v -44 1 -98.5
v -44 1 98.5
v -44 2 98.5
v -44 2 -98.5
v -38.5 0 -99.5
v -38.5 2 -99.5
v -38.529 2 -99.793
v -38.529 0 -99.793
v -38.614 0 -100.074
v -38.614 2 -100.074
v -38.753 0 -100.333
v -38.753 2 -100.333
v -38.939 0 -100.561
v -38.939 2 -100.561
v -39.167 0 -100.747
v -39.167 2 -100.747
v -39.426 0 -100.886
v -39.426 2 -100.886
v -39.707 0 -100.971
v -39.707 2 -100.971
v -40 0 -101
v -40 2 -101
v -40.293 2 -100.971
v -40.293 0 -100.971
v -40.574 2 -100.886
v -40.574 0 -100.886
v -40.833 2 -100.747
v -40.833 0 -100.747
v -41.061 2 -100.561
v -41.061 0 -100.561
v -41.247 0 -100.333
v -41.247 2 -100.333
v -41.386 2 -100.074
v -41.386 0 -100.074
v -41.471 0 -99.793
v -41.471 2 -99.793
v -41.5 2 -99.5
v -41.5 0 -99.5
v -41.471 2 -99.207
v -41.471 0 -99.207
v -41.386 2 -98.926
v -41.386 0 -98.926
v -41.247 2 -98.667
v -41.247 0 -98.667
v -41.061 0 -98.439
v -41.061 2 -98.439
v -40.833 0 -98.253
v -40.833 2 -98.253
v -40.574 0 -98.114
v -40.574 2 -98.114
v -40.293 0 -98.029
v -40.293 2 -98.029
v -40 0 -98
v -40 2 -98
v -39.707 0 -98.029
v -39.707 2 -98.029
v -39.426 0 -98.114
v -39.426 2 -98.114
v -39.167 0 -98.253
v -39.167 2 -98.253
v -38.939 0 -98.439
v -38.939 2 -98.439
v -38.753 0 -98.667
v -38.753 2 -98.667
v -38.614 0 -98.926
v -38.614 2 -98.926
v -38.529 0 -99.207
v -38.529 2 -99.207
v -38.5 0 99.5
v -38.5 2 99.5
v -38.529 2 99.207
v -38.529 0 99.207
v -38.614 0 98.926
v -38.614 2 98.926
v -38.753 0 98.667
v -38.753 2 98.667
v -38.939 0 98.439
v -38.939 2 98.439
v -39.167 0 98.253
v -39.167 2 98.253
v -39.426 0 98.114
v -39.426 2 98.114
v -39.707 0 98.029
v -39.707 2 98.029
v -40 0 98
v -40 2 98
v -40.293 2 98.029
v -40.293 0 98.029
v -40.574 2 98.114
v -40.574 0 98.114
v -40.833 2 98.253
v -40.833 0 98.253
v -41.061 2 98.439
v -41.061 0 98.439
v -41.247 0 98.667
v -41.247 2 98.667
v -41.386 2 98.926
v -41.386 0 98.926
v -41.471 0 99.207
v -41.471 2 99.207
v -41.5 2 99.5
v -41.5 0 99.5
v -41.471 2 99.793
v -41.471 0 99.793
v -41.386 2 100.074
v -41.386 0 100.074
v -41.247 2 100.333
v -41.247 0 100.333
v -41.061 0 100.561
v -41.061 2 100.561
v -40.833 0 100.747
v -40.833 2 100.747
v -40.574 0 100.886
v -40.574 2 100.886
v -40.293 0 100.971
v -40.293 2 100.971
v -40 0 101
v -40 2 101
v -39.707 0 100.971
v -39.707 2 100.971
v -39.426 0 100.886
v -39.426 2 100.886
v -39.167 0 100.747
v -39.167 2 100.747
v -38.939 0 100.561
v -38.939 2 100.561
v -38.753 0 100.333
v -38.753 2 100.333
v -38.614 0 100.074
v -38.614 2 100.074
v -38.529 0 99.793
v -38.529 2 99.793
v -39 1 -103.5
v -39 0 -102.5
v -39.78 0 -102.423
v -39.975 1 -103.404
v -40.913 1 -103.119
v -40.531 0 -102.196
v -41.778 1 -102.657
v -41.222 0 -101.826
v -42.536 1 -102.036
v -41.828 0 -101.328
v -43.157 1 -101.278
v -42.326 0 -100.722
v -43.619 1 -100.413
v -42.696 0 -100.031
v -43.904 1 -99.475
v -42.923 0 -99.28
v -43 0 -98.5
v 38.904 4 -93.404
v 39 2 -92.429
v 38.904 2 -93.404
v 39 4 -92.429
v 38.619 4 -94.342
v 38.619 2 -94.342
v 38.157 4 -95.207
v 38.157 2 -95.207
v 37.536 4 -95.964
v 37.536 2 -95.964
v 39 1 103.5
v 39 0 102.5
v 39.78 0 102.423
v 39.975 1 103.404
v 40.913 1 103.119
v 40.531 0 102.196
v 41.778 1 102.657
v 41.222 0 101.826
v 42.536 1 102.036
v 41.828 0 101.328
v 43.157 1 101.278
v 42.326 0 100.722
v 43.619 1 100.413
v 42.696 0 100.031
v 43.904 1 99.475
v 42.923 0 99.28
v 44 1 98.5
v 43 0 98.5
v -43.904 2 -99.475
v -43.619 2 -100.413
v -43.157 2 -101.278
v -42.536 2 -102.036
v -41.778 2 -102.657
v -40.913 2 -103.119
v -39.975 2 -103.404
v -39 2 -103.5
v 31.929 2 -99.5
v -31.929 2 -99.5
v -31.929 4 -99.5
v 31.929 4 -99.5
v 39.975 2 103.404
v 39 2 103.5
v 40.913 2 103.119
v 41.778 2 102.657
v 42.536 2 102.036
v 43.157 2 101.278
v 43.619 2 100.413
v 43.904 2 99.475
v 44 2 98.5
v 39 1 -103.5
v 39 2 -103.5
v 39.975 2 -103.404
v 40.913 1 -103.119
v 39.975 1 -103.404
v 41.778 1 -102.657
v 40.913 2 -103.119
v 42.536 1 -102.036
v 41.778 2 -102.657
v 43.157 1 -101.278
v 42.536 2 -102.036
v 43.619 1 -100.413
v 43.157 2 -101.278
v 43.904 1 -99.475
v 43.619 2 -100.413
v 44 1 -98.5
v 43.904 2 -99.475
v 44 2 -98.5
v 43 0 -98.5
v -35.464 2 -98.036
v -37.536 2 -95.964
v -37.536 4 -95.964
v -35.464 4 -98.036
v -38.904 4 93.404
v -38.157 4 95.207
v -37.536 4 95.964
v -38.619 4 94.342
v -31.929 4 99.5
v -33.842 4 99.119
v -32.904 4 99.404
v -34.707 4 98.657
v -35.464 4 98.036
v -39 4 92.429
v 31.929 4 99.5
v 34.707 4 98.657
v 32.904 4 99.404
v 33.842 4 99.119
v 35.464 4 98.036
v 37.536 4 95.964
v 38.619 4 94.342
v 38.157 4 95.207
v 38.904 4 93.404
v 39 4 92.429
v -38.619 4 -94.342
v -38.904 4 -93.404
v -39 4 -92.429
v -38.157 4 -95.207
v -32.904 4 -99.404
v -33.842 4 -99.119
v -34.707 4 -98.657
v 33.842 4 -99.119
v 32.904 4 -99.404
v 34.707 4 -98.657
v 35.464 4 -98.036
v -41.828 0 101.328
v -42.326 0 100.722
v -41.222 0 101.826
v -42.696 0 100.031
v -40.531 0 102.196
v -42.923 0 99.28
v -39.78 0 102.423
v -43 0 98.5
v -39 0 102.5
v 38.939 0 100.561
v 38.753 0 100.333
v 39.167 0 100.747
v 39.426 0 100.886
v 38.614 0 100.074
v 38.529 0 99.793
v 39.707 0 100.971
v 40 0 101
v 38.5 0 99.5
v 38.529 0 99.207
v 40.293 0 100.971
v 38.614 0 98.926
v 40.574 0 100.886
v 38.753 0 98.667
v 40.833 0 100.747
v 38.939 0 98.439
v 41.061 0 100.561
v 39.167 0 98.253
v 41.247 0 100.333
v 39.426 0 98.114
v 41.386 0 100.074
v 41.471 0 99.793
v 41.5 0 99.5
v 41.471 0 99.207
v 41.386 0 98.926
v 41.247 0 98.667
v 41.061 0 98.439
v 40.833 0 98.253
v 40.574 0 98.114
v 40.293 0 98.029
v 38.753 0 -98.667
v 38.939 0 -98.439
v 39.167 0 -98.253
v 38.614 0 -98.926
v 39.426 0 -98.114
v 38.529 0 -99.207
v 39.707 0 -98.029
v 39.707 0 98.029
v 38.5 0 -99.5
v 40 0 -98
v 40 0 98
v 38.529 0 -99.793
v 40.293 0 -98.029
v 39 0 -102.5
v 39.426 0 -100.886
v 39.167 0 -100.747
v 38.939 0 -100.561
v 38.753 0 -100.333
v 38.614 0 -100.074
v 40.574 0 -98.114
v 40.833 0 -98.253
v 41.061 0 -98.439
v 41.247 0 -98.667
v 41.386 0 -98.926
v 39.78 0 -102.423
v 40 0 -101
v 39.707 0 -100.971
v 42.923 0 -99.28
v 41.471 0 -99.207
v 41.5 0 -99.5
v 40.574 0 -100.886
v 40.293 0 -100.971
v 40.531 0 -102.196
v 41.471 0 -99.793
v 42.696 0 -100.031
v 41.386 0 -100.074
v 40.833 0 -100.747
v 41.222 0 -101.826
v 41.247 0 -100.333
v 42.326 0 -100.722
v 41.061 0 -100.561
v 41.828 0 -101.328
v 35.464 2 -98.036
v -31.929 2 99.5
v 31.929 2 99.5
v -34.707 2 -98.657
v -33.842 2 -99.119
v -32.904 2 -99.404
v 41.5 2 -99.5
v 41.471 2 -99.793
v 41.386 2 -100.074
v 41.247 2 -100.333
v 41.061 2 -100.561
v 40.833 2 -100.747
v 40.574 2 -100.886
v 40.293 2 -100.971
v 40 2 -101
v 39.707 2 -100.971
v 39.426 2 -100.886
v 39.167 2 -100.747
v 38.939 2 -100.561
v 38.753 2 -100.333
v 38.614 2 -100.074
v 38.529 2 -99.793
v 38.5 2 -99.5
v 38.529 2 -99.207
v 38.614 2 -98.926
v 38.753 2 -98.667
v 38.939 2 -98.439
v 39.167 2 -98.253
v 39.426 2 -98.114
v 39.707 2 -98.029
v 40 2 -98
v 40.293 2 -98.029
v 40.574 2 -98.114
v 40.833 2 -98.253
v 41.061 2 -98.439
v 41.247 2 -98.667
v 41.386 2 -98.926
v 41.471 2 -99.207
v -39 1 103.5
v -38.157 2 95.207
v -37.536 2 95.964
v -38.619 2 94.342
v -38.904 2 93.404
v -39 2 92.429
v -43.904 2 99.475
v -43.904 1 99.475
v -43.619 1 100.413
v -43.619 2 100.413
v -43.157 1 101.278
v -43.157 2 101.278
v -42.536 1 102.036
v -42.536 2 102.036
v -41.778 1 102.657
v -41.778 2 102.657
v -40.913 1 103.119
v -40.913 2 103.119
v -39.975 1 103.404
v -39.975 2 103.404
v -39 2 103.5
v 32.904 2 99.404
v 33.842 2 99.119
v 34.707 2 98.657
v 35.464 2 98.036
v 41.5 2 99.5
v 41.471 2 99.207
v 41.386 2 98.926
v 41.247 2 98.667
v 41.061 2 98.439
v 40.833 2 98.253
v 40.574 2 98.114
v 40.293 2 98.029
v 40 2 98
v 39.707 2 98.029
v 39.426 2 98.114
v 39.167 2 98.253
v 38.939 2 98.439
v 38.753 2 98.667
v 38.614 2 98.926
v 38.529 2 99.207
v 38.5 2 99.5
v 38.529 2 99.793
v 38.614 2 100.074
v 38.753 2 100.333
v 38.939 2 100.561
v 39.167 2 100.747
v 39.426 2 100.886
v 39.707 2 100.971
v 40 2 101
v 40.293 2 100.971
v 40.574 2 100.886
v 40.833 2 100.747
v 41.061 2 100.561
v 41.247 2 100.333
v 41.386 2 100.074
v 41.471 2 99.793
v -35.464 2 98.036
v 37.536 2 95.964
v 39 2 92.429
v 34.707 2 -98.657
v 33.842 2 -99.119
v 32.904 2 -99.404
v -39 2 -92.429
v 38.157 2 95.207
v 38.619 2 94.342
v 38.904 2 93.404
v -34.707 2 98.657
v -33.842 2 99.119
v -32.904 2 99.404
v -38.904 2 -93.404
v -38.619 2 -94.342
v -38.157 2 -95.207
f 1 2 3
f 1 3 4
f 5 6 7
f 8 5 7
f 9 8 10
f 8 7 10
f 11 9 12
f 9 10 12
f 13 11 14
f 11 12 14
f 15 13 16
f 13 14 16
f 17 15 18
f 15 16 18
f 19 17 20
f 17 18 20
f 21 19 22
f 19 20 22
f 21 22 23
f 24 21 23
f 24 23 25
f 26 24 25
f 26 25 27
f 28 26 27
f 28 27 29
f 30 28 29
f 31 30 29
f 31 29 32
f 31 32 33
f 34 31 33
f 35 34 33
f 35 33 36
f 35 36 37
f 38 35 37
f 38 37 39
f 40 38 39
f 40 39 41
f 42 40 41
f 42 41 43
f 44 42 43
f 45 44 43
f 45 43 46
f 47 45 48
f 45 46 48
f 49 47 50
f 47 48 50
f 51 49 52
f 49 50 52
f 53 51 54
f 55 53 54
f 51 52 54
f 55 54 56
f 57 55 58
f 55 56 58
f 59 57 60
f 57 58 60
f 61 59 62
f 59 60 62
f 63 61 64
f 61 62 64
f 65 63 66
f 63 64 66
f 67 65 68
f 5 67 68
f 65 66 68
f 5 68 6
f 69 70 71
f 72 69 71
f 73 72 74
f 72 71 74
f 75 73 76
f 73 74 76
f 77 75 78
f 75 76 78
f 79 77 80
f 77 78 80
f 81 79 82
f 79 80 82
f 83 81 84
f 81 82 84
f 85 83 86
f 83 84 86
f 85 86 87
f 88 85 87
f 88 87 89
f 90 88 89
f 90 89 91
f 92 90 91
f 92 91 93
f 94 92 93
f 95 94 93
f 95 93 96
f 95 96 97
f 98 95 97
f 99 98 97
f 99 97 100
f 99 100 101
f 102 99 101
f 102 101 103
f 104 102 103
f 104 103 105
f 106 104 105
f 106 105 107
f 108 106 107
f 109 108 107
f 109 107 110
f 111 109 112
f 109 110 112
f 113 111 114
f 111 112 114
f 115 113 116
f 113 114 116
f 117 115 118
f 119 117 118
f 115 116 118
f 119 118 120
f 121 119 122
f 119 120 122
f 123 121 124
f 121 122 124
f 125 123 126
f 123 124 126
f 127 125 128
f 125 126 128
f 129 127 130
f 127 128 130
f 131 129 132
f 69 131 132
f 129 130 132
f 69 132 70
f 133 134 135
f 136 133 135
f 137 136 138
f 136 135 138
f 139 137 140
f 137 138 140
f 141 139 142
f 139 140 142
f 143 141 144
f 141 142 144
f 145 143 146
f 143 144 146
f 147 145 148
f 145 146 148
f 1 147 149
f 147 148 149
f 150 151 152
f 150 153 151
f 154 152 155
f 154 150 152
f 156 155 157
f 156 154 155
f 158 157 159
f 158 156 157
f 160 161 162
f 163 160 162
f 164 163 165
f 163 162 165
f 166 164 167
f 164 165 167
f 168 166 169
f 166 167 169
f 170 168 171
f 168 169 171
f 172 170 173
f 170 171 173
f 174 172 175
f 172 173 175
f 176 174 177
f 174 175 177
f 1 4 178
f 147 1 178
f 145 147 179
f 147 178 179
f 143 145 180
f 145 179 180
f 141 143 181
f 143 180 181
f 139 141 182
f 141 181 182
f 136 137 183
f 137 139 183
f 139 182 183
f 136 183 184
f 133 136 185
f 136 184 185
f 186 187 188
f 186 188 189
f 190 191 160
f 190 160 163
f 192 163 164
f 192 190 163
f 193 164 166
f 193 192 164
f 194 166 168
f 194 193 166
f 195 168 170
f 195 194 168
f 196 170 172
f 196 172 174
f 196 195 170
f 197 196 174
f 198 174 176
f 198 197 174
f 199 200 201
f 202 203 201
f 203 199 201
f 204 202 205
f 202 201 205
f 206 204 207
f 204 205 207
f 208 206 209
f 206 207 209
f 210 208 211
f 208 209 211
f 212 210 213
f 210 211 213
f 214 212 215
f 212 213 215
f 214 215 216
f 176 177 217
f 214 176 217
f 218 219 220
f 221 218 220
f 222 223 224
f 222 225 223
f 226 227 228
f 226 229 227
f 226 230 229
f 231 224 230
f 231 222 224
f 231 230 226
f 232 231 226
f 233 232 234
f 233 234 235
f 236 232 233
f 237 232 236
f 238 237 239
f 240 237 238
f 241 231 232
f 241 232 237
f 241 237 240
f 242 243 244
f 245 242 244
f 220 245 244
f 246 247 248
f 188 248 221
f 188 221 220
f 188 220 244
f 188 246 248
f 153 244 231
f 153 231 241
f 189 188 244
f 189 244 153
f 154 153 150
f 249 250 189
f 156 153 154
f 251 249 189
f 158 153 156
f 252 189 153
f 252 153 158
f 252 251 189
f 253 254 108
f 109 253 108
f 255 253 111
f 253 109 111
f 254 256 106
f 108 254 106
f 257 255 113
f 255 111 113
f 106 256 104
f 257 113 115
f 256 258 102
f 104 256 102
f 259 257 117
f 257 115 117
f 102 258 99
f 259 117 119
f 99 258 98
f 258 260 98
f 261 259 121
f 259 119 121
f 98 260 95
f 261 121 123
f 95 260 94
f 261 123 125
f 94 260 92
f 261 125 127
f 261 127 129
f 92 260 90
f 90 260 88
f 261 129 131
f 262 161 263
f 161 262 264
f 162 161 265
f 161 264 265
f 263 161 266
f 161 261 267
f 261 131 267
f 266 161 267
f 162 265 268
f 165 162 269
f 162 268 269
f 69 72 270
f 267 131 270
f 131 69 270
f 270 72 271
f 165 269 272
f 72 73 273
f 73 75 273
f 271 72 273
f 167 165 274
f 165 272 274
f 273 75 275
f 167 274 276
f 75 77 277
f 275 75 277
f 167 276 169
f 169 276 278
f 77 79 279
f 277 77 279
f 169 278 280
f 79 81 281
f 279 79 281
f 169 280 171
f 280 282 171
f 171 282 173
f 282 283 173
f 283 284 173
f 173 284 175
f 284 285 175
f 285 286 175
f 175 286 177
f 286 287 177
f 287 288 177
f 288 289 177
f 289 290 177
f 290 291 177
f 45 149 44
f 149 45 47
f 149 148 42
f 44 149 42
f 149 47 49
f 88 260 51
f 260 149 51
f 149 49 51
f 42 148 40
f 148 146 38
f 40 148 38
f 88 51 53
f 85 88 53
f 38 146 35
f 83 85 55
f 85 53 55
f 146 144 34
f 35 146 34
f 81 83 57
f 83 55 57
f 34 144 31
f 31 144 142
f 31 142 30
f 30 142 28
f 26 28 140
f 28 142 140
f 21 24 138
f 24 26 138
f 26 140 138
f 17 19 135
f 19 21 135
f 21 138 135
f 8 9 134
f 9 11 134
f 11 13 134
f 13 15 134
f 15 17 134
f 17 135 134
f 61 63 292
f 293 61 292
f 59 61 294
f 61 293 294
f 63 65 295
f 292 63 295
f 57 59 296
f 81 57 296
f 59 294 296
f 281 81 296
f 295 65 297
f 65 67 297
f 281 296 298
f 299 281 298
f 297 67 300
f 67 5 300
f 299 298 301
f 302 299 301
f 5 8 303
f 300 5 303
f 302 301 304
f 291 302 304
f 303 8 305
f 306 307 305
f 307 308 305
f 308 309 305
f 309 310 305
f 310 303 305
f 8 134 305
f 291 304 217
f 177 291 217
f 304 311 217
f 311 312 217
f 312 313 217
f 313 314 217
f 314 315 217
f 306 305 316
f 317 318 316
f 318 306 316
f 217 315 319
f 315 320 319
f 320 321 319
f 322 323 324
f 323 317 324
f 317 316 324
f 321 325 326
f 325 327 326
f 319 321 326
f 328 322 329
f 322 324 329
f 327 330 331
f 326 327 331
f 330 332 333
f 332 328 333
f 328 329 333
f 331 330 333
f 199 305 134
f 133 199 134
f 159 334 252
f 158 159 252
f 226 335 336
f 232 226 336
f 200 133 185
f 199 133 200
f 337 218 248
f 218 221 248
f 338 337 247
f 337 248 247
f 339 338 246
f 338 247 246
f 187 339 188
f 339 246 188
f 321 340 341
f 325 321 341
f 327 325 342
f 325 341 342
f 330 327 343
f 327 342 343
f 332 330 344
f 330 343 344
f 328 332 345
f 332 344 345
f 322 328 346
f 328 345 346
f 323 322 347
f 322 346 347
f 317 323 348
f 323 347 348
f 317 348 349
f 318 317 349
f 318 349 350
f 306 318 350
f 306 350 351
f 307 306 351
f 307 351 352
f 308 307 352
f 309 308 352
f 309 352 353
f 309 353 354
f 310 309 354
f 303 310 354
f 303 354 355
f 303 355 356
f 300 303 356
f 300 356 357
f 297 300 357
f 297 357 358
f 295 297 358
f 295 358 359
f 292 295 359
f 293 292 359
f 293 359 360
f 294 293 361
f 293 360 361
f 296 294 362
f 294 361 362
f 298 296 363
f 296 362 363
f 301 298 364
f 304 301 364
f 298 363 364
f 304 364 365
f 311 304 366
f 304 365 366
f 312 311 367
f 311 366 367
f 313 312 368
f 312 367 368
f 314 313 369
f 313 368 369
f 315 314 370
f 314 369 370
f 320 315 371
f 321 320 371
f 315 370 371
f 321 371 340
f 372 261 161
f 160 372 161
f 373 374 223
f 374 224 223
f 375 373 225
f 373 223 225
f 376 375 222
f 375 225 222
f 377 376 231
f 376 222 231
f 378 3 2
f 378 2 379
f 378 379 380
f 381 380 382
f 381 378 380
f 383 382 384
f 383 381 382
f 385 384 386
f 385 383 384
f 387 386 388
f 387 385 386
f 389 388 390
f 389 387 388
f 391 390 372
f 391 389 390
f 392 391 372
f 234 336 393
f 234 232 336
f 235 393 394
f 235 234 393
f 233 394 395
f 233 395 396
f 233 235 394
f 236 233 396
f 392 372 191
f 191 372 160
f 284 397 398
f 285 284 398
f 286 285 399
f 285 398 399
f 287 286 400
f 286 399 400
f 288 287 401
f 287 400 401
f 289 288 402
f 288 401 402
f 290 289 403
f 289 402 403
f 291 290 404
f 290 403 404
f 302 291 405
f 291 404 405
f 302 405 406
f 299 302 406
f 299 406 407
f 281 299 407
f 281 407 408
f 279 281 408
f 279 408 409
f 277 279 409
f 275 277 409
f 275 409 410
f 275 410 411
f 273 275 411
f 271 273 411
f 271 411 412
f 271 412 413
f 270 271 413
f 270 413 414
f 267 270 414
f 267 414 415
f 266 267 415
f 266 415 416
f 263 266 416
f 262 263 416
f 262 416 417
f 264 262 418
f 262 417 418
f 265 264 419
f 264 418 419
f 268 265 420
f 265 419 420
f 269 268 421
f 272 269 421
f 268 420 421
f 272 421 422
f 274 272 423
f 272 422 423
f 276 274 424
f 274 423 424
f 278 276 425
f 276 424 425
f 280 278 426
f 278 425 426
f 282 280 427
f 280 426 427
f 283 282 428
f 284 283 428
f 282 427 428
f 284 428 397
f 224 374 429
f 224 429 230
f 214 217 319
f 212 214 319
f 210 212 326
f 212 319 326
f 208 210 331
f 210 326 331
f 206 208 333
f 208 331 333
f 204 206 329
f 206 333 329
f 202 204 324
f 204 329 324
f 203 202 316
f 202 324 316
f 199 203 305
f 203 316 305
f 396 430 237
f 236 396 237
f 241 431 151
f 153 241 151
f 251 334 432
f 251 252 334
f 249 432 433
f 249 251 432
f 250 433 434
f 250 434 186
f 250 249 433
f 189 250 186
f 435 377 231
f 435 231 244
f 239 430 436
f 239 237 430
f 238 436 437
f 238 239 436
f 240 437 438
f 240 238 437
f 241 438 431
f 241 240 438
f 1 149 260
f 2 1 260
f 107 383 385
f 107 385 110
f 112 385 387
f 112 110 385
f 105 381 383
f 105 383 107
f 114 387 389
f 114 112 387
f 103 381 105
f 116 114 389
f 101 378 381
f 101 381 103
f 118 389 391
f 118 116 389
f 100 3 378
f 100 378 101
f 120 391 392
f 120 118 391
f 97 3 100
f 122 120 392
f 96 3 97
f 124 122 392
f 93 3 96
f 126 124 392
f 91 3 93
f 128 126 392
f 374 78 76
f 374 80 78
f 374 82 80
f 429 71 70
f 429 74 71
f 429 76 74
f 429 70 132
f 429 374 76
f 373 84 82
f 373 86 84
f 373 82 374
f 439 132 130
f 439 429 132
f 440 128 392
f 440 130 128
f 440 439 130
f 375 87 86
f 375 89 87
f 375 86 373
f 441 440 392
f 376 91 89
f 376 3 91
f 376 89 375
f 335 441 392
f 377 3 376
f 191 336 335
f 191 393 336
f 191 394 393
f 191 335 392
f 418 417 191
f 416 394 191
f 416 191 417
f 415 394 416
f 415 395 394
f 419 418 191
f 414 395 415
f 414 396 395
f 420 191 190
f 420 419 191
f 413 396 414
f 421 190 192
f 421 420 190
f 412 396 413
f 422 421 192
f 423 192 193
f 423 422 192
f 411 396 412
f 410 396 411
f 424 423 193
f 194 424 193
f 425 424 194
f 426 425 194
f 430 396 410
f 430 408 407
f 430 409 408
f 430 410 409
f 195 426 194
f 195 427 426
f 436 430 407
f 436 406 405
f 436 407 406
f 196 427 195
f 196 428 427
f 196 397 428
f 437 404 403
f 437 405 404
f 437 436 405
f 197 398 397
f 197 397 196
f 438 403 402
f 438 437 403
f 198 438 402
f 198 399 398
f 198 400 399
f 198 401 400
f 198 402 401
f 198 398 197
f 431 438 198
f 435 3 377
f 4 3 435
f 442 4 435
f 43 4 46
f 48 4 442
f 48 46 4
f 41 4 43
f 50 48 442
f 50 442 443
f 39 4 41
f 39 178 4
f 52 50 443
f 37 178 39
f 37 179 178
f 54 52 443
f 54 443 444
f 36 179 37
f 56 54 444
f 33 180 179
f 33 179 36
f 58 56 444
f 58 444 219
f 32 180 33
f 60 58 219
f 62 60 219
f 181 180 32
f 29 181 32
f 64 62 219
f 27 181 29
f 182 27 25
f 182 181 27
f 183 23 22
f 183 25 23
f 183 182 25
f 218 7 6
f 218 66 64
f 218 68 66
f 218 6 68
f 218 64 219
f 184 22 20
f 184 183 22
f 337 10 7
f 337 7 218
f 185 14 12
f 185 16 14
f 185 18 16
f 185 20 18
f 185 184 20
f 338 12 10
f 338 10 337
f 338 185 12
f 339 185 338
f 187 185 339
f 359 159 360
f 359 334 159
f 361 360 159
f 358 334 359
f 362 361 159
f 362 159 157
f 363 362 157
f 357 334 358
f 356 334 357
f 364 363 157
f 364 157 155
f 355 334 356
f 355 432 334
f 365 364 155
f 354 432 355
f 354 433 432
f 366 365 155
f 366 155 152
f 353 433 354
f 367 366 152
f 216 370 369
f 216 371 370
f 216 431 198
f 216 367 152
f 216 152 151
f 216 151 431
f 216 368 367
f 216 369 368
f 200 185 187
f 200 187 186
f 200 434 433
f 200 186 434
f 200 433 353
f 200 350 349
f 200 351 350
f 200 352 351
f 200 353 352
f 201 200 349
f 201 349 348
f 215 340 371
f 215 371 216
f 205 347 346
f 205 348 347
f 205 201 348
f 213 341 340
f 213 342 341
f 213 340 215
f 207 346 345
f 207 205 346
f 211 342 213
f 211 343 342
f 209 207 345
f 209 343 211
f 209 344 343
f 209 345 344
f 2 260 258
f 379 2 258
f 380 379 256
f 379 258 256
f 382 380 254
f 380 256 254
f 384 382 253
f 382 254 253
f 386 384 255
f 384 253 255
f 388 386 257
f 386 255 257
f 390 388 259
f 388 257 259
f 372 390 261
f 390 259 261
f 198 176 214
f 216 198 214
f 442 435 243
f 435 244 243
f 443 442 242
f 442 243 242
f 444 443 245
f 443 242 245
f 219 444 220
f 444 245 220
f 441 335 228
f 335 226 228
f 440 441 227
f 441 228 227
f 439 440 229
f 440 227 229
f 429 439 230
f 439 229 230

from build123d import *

# Parameters (mm, degrees)
SKETCH1_W                 = 88
SKETCH1_H                 = 207
BOSS_EXTRUDE1_DEPTH       = 2
SKETCH2_W                 = 78
SKETCH2_H                 = 199
BOSS_EXTRUDE2_DEPTH       = 2
CHAMFER1_SIZE             = 5
FILLET1_R                 = 5
F_3_0MM_DOWEL_HOLE1_D     = 3
F_3_0MM_DOWEL_HOLE1_DEPTH = 17.29
F_3_0MM_DOWEL_HOLE1_TIP   = 0.901290929
CHAMFER2_SIZE             = 1


with BuildPart() as part:
    # Sketch1 → Boss-Extrude1 (new body)
    with BuildSketch(Plane(origin=(0, 0, 0), x_dir=(1, 0, 0), z_dir=(0, 1, 0))):
        Rectangle(SKETCH1_W, SKETCH1_H)
    extrude(amount=BOSS_EXTRUDE1_DEPTH)

    # Sketch2 → Boss-Extrude2 (add)
    with BuildSketch(Plane(origin=(0, 2, 0), x_dir=(1, 0, 0), z_dir=(0, 1, 0))):
        Rectangle(SKETCH2_W, SKETCH2_H)
    extrude(amount=BOSS_EXTRUDE2_DEPTH)

    # Chamfer1
    chamfer1_edges = [part.edges().sort_by_distance(p)[0] for p in [
        (39, 3, 99.5),
        (39, 3, -99.5),
        (-39, 3, -99.5),
        (-39, 3, 99.5),
    ]]
    chamfer(chamfer1_edges, length=CHAMFER1_SIZE)

    # Fillet1
    fillet1_edges = [part.edges().sort_by_distance(p)[0] for p in [
        (-39, 3, 94.5),
        (-39, 3, -94.5),
        (34, 3, -99.5),
        (-34, 3, -99.5),
        (39, 3, 94.5),
        (39, 3, -94.5),
        (34, 3, 99.5),
        (-34, 3, 99.5),
        (44, 1, 103.5),
        (-44, 1, 103.5),
        (-44, 1, -103.5),
        (44, 1, -103.5),
    ]]
    fillet(fillet1_edges, radius=FILLET1_R)

    # Ø3.0mm Dowel Hole1
    with Locations(Plane(origin=(0, 0, 0), x_dir=(-1, 0, 0), z_dir=(0, -1, 0))):
        with Locations((-40, 99.5), (40, 99.5), (40, -99.5), (-40, -99.5)):
            Hole(F_3_0MM_DOWEL_HOLE1_D / 2, depth=F_3_0MM_DOWEL_HOLE1_DEPTH)
            with Locations((0, 0, -(F_3_0MM_DOWEL_HOLE1_DEPTH + F_3_0MM_DOWEL_HOLE1_TIP / 2))):  # 118° drill point
                Cone(0, F_3_0MM_DOWEL_HOLE1_D / 2, F_3_0MM_DOWEL_HOLE1_TIP, mode=Mode.SUBTRACT)

    # Chamfer2
    chamfer2_edges = [part.edges().sort_by_distance(p)[0] for p in [
        (0, 0, 103.5),
        (44, 0, 0),
        (-44, 0, 0),
        (0, 0, -103.5),
        (-42.535533906, 0, -102.035533906),
        (42.535533906, 0, -102.035533906),
        (42.535533906, 0, 102.035533906),
        (-42.535533906, 0, 102.035533906),
    ]]
    chamfer(chamfer2_edges, length=CHAMFER2_SIZE)


solid = part.part
